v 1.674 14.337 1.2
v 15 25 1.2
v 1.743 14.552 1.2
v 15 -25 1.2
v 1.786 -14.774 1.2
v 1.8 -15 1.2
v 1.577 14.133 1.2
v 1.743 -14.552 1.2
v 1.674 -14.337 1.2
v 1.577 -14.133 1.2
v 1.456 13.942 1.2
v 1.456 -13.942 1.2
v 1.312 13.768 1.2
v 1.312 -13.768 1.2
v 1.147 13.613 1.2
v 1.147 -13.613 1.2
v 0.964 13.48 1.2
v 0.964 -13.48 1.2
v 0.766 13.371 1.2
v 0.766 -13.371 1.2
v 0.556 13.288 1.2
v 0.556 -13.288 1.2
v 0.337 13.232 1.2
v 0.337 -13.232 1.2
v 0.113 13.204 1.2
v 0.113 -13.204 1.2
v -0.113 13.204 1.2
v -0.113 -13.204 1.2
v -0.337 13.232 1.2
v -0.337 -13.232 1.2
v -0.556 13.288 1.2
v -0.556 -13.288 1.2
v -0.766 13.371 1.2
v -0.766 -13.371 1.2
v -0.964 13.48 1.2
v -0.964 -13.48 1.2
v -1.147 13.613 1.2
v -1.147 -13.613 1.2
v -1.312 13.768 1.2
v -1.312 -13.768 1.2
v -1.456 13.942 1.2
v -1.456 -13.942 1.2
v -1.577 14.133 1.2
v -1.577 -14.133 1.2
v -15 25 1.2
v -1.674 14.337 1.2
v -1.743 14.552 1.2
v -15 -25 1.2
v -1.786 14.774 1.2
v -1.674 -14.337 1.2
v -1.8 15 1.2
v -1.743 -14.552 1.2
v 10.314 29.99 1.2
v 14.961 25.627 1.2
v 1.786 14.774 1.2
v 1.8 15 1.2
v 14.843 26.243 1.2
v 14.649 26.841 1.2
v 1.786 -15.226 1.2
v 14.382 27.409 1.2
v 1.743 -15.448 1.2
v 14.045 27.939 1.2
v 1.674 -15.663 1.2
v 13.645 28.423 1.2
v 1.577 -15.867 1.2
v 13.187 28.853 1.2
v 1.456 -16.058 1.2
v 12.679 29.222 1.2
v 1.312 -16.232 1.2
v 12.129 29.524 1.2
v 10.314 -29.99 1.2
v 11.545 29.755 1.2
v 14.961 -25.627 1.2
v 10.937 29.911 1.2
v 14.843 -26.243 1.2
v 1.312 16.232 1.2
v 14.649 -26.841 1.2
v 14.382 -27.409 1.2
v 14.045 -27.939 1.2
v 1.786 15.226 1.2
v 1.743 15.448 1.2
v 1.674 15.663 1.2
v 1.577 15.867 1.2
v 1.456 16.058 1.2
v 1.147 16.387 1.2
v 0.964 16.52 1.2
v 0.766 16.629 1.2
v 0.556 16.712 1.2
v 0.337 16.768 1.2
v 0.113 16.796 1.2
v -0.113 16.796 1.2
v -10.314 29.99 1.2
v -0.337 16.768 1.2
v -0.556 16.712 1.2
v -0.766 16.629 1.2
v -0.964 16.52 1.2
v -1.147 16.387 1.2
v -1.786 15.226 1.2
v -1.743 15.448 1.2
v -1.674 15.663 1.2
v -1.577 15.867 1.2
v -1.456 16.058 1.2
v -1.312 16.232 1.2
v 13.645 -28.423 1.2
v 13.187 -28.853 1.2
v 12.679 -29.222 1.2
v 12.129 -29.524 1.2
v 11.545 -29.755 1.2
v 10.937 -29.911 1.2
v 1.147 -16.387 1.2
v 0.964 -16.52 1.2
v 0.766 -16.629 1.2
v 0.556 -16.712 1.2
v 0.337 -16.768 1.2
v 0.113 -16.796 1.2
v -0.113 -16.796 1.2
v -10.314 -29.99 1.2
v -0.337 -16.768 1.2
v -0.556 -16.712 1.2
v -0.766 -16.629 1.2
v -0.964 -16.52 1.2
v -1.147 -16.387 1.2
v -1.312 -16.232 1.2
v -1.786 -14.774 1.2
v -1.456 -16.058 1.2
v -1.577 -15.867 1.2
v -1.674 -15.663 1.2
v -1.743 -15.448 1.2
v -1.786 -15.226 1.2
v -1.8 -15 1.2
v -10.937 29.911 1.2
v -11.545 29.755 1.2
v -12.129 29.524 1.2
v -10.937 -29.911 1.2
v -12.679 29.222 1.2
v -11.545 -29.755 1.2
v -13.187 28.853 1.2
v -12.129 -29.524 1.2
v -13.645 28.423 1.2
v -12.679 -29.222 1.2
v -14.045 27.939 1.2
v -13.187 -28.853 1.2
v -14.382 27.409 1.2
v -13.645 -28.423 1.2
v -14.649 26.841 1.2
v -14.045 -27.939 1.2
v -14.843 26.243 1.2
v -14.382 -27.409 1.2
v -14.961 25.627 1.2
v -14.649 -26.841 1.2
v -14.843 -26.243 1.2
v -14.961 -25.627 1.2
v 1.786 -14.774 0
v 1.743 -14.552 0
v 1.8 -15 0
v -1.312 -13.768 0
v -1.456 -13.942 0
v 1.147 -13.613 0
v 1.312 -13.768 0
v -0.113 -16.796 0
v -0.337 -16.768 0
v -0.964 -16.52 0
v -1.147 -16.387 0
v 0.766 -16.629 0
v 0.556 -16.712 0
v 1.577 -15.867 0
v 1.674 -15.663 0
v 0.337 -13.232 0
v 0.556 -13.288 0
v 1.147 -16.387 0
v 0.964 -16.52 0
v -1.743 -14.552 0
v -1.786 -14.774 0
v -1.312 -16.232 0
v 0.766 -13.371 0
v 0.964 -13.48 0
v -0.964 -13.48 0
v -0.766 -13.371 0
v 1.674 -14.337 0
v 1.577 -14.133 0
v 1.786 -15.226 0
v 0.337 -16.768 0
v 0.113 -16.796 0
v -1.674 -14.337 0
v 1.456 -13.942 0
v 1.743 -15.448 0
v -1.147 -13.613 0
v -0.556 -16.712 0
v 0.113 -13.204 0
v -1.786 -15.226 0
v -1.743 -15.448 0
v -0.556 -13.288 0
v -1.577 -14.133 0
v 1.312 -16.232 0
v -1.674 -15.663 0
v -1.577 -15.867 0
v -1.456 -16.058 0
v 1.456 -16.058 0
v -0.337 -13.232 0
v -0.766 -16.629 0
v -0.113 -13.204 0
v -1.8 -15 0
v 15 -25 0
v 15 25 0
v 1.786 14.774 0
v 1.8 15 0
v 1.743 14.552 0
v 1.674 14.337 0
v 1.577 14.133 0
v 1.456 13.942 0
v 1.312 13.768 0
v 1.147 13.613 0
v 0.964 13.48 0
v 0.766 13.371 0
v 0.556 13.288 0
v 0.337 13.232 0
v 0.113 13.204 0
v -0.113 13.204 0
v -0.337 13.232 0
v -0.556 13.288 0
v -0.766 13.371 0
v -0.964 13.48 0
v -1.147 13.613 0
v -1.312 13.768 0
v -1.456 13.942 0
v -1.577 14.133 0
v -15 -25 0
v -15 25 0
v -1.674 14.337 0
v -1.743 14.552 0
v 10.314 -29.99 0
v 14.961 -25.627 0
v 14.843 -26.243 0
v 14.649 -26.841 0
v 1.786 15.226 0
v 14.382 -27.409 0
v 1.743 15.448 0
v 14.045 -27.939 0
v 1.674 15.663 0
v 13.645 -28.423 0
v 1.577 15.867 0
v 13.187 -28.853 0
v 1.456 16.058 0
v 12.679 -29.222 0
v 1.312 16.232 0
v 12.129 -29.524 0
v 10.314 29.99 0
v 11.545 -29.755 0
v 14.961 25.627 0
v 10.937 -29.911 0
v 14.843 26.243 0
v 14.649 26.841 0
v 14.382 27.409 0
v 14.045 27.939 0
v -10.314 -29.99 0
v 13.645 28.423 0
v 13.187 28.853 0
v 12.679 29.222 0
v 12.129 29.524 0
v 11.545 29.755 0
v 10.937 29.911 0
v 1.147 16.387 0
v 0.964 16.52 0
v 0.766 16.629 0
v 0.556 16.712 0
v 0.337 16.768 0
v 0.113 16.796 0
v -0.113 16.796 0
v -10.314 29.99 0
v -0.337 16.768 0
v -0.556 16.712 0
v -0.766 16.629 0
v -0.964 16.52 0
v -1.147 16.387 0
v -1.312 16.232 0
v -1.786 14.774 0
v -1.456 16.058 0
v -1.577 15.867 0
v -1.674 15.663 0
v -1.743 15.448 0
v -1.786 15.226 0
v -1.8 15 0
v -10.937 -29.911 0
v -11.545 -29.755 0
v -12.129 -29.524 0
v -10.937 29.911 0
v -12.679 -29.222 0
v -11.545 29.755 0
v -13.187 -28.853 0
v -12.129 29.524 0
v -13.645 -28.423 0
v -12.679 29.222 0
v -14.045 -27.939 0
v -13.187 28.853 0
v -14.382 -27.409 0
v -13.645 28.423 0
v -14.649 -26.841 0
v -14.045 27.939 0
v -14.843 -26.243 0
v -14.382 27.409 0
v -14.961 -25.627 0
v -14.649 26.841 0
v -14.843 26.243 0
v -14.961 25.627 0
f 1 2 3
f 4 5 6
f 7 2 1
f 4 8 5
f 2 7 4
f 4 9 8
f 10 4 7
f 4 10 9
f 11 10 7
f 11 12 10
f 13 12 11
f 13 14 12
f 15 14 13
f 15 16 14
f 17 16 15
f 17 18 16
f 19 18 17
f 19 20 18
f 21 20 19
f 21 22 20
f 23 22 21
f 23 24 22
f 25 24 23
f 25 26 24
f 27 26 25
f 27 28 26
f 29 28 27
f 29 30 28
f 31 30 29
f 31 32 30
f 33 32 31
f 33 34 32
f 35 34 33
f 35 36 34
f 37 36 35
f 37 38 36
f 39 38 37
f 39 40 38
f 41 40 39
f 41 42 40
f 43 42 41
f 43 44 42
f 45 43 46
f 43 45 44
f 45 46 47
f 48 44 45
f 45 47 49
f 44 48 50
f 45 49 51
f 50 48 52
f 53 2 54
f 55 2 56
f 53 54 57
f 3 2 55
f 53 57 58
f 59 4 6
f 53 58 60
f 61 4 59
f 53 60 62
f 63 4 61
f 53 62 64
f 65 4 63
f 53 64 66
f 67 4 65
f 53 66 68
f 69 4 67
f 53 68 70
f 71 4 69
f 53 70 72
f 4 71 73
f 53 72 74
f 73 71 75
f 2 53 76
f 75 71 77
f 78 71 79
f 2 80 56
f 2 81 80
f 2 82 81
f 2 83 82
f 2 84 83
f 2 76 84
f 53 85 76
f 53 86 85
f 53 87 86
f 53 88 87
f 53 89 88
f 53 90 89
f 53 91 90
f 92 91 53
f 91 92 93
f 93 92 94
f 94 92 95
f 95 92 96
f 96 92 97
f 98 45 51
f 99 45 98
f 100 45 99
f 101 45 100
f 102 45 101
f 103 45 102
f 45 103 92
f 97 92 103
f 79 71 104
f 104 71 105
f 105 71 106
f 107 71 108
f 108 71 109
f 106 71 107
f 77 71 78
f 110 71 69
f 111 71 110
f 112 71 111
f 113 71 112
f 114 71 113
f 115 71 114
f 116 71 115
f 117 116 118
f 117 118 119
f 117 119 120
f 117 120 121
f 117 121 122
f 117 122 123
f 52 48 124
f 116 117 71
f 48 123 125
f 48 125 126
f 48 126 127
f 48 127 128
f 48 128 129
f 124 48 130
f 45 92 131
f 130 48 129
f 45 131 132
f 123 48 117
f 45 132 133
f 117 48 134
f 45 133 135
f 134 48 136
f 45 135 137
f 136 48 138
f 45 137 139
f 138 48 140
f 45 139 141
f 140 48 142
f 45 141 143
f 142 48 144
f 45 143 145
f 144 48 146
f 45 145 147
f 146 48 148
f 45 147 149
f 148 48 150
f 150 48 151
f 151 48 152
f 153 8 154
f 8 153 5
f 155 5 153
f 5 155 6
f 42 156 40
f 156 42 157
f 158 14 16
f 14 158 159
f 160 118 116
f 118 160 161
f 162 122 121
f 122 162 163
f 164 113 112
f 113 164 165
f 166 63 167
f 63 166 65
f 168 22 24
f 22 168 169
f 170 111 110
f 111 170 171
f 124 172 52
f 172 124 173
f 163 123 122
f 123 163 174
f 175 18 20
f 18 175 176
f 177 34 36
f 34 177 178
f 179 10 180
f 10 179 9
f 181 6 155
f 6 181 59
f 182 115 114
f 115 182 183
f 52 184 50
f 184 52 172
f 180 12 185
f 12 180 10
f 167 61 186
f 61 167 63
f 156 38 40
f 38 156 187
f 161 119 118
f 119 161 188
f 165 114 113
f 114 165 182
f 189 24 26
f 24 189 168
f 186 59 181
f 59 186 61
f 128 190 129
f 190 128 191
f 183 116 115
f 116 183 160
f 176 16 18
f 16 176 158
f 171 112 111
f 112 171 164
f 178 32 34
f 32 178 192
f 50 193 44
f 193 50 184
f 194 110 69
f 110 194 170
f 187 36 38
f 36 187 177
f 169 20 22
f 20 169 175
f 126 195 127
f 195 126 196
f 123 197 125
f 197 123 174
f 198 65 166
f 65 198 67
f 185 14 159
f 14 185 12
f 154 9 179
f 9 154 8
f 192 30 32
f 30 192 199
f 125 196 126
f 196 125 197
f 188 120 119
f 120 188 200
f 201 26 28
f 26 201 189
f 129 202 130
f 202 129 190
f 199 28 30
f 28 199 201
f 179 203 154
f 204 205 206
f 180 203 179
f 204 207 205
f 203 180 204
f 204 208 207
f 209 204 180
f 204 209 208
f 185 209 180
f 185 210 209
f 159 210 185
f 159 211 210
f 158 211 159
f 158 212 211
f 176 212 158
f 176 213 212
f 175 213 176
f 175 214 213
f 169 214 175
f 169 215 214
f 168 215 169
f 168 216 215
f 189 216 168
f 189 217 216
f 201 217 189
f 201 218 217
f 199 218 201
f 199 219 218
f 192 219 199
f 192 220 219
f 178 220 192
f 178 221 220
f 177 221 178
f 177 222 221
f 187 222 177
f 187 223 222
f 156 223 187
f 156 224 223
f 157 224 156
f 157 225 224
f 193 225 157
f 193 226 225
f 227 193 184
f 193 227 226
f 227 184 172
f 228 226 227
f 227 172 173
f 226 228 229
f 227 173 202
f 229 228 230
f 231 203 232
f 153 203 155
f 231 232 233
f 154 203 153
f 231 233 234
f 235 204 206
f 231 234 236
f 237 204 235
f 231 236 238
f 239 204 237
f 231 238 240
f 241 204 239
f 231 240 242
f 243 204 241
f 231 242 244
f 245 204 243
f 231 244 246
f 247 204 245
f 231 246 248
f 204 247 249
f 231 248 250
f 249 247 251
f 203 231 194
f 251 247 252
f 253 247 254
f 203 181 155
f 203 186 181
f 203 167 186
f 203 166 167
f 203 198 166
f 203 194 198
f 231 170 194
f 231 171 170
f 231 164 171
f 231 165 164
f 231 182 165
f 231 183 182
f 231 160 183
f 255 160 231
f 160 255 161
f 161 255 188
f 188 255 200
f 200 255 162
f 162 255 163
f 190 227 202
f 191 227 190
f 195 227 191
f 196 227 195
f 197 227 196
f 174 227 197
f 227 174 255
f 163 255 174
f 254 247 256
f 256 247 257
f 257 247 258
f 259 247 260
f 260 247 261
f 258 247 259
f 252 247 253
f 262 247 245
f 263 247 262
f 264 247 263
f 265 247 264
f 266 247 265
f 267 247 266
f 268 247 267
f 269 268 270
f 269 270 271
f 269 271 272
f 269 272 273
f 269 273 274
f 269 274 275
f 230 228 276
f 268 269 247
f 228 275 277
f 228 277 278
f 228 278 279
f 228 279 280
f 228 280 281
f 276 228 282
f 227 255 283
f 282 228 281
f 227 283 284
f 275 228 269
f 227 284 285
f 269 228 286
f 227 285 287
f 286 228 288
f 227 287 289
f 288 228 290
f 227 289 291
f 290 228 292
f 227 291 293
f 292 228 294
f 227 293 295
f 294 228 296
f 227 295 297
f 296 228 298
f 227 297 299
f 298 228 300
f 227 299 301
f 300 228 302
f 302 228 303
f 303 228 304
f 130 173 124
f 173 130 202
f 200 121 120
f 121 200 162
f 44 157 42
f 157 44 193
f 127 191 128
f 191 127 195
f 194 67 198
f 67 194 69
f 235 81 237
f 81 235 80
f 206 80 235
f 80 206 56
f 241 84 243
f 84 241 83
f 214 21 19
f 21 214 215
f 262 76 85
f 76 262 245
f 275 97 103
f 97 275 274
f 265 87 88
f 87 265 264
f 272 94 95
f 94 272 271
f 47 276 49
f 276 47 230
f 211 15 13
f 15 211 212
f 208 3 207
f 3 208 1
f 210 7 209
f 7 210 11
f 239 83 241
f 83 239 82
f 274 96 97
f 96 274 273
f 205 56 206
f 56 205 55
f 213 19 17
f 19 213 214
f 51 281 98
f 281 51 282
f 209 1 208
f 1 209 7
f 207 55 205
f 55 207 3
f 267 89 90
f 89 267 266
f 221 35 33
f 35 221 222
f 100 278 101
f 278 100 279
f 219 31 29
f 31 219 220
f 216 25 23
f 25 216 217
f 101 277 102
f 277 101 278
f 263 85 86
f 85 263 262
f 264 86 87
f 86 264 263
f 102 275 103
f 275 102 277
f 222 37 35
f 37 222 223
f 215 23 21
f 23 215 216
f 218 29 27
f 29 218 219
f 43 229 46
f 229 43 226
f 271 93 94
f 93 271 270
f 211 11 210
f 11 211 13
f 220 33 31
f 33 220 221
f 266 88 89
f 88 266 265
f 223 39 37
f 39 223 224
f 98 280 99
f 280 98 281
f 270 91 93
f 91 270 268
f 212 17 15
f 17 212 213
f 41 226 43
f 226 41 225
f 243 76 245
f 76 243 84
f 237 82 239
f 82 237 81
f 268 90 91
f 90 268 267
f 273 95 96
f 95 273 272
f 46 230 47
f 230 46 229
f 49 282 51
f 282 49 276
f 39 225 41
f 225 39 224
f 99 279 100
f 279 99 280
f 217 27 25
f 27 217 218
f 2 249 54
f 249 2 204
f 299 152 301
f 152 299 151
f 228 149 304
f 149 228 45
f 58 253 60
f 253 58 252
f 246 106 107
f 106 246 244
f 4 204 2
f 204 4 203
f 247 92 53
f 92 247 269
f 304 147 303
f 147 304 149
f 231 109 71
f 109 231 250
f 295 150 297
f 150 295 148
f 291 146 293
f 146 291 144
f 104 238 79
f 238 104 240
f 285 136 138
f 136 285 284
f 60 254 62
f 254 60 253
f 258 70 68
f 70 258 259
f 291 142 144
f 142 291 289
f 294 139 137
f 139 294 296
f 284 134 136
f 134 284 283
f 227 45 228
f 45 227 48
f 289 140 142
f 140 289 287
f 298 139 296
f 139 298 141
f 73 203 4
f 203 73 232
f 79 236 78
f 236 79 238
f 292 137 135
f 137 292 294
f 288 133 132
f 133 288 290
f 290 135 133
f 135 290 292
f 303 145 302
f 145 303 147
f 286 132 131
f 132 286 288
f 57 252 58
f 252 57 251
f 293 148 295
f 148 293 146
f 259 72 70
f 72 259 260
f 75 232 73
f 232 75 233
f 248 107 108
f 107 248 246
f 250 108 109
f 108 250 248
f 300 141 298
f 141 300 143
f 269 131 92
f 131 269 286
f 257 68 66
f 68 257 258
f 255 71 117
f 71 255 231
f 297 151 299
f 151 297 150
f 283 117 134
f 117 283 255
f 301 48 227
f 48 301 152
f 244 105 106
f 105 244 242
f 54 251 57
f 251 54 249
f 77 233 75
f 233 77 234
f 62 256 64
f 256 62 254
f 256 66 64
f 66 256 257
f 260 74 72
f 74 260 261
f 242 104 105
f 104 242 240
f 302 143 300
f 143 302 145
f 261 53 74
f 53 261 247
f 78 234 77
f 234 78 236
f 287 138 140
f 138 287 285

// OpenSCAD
$fn = 50;


difference() {
	union() {
		hull() {
			translate(v = [-10.0000000000, 25.0000000000, 0]) {
				cylinder(h = 15, r = 5);
			}
			translate(v = [10.0000000000, 25.0000000000, 0]) {
				cylinder(h = 15, r = 5);
			}
			translate(v = [-10.0000000000, -25.0000000000, 0]) {
				cylinder(h = 15, r = 5);
			}
			translate(v = [10.0000000000, -25.0000000000, 0]) {
				cylinder(h = 15, r = 5);
			}
		}
	}
	union() {
		translate(v = [0, 0, 1.2000000000]) {
			hull() {
				translate(v = [-10.0000000000, 25.0000000000, 0]) {
					cylinder(h = 13.8000000000, r = 3.8000000000);
				}
				translate(v = [10.0000000000, 25.0000000000, 0]) {
					cylinder(h = 13.8000000000, r = 3.8000000000);
				}
				translate(v = [-10.0000000000, -25.0000000000, 0]) {
					cylinder(h = 13.8000000000, r = 3.8000000000);
				}
				translate(v = [10.0000000000, -25.0000000000, 0]) {
					cylinder(h = 13.8000000000, r = 3.8000000000);
				}
			}
		}
		#translate(v = [0.0000000000, -15.0000000000, 0]) {
			cylinder(h = 1.2000000000, r = 1.8000000000);
		}
		#translate(v = [0.0000000000, 15.0000000000, 0]) {
			cylinder(h = 1.2000000000, r = 1.8000000000);
		}
		translate(v = [-250.0000000000, -250.0000000000, 1.2000000000]) {
			cube(size = [500, 500, 500]);
		}
		translate(v = [-250.0000000000, -250.0000000000, 1.2000000000]) {
			cube(size = [500, 500, 500]);
		}
		translate(v = [-250.0000000000, -250.0000000000, 1.2000000000]) {
			cube(size = [500, 500, 500]);
		}
	}
}
